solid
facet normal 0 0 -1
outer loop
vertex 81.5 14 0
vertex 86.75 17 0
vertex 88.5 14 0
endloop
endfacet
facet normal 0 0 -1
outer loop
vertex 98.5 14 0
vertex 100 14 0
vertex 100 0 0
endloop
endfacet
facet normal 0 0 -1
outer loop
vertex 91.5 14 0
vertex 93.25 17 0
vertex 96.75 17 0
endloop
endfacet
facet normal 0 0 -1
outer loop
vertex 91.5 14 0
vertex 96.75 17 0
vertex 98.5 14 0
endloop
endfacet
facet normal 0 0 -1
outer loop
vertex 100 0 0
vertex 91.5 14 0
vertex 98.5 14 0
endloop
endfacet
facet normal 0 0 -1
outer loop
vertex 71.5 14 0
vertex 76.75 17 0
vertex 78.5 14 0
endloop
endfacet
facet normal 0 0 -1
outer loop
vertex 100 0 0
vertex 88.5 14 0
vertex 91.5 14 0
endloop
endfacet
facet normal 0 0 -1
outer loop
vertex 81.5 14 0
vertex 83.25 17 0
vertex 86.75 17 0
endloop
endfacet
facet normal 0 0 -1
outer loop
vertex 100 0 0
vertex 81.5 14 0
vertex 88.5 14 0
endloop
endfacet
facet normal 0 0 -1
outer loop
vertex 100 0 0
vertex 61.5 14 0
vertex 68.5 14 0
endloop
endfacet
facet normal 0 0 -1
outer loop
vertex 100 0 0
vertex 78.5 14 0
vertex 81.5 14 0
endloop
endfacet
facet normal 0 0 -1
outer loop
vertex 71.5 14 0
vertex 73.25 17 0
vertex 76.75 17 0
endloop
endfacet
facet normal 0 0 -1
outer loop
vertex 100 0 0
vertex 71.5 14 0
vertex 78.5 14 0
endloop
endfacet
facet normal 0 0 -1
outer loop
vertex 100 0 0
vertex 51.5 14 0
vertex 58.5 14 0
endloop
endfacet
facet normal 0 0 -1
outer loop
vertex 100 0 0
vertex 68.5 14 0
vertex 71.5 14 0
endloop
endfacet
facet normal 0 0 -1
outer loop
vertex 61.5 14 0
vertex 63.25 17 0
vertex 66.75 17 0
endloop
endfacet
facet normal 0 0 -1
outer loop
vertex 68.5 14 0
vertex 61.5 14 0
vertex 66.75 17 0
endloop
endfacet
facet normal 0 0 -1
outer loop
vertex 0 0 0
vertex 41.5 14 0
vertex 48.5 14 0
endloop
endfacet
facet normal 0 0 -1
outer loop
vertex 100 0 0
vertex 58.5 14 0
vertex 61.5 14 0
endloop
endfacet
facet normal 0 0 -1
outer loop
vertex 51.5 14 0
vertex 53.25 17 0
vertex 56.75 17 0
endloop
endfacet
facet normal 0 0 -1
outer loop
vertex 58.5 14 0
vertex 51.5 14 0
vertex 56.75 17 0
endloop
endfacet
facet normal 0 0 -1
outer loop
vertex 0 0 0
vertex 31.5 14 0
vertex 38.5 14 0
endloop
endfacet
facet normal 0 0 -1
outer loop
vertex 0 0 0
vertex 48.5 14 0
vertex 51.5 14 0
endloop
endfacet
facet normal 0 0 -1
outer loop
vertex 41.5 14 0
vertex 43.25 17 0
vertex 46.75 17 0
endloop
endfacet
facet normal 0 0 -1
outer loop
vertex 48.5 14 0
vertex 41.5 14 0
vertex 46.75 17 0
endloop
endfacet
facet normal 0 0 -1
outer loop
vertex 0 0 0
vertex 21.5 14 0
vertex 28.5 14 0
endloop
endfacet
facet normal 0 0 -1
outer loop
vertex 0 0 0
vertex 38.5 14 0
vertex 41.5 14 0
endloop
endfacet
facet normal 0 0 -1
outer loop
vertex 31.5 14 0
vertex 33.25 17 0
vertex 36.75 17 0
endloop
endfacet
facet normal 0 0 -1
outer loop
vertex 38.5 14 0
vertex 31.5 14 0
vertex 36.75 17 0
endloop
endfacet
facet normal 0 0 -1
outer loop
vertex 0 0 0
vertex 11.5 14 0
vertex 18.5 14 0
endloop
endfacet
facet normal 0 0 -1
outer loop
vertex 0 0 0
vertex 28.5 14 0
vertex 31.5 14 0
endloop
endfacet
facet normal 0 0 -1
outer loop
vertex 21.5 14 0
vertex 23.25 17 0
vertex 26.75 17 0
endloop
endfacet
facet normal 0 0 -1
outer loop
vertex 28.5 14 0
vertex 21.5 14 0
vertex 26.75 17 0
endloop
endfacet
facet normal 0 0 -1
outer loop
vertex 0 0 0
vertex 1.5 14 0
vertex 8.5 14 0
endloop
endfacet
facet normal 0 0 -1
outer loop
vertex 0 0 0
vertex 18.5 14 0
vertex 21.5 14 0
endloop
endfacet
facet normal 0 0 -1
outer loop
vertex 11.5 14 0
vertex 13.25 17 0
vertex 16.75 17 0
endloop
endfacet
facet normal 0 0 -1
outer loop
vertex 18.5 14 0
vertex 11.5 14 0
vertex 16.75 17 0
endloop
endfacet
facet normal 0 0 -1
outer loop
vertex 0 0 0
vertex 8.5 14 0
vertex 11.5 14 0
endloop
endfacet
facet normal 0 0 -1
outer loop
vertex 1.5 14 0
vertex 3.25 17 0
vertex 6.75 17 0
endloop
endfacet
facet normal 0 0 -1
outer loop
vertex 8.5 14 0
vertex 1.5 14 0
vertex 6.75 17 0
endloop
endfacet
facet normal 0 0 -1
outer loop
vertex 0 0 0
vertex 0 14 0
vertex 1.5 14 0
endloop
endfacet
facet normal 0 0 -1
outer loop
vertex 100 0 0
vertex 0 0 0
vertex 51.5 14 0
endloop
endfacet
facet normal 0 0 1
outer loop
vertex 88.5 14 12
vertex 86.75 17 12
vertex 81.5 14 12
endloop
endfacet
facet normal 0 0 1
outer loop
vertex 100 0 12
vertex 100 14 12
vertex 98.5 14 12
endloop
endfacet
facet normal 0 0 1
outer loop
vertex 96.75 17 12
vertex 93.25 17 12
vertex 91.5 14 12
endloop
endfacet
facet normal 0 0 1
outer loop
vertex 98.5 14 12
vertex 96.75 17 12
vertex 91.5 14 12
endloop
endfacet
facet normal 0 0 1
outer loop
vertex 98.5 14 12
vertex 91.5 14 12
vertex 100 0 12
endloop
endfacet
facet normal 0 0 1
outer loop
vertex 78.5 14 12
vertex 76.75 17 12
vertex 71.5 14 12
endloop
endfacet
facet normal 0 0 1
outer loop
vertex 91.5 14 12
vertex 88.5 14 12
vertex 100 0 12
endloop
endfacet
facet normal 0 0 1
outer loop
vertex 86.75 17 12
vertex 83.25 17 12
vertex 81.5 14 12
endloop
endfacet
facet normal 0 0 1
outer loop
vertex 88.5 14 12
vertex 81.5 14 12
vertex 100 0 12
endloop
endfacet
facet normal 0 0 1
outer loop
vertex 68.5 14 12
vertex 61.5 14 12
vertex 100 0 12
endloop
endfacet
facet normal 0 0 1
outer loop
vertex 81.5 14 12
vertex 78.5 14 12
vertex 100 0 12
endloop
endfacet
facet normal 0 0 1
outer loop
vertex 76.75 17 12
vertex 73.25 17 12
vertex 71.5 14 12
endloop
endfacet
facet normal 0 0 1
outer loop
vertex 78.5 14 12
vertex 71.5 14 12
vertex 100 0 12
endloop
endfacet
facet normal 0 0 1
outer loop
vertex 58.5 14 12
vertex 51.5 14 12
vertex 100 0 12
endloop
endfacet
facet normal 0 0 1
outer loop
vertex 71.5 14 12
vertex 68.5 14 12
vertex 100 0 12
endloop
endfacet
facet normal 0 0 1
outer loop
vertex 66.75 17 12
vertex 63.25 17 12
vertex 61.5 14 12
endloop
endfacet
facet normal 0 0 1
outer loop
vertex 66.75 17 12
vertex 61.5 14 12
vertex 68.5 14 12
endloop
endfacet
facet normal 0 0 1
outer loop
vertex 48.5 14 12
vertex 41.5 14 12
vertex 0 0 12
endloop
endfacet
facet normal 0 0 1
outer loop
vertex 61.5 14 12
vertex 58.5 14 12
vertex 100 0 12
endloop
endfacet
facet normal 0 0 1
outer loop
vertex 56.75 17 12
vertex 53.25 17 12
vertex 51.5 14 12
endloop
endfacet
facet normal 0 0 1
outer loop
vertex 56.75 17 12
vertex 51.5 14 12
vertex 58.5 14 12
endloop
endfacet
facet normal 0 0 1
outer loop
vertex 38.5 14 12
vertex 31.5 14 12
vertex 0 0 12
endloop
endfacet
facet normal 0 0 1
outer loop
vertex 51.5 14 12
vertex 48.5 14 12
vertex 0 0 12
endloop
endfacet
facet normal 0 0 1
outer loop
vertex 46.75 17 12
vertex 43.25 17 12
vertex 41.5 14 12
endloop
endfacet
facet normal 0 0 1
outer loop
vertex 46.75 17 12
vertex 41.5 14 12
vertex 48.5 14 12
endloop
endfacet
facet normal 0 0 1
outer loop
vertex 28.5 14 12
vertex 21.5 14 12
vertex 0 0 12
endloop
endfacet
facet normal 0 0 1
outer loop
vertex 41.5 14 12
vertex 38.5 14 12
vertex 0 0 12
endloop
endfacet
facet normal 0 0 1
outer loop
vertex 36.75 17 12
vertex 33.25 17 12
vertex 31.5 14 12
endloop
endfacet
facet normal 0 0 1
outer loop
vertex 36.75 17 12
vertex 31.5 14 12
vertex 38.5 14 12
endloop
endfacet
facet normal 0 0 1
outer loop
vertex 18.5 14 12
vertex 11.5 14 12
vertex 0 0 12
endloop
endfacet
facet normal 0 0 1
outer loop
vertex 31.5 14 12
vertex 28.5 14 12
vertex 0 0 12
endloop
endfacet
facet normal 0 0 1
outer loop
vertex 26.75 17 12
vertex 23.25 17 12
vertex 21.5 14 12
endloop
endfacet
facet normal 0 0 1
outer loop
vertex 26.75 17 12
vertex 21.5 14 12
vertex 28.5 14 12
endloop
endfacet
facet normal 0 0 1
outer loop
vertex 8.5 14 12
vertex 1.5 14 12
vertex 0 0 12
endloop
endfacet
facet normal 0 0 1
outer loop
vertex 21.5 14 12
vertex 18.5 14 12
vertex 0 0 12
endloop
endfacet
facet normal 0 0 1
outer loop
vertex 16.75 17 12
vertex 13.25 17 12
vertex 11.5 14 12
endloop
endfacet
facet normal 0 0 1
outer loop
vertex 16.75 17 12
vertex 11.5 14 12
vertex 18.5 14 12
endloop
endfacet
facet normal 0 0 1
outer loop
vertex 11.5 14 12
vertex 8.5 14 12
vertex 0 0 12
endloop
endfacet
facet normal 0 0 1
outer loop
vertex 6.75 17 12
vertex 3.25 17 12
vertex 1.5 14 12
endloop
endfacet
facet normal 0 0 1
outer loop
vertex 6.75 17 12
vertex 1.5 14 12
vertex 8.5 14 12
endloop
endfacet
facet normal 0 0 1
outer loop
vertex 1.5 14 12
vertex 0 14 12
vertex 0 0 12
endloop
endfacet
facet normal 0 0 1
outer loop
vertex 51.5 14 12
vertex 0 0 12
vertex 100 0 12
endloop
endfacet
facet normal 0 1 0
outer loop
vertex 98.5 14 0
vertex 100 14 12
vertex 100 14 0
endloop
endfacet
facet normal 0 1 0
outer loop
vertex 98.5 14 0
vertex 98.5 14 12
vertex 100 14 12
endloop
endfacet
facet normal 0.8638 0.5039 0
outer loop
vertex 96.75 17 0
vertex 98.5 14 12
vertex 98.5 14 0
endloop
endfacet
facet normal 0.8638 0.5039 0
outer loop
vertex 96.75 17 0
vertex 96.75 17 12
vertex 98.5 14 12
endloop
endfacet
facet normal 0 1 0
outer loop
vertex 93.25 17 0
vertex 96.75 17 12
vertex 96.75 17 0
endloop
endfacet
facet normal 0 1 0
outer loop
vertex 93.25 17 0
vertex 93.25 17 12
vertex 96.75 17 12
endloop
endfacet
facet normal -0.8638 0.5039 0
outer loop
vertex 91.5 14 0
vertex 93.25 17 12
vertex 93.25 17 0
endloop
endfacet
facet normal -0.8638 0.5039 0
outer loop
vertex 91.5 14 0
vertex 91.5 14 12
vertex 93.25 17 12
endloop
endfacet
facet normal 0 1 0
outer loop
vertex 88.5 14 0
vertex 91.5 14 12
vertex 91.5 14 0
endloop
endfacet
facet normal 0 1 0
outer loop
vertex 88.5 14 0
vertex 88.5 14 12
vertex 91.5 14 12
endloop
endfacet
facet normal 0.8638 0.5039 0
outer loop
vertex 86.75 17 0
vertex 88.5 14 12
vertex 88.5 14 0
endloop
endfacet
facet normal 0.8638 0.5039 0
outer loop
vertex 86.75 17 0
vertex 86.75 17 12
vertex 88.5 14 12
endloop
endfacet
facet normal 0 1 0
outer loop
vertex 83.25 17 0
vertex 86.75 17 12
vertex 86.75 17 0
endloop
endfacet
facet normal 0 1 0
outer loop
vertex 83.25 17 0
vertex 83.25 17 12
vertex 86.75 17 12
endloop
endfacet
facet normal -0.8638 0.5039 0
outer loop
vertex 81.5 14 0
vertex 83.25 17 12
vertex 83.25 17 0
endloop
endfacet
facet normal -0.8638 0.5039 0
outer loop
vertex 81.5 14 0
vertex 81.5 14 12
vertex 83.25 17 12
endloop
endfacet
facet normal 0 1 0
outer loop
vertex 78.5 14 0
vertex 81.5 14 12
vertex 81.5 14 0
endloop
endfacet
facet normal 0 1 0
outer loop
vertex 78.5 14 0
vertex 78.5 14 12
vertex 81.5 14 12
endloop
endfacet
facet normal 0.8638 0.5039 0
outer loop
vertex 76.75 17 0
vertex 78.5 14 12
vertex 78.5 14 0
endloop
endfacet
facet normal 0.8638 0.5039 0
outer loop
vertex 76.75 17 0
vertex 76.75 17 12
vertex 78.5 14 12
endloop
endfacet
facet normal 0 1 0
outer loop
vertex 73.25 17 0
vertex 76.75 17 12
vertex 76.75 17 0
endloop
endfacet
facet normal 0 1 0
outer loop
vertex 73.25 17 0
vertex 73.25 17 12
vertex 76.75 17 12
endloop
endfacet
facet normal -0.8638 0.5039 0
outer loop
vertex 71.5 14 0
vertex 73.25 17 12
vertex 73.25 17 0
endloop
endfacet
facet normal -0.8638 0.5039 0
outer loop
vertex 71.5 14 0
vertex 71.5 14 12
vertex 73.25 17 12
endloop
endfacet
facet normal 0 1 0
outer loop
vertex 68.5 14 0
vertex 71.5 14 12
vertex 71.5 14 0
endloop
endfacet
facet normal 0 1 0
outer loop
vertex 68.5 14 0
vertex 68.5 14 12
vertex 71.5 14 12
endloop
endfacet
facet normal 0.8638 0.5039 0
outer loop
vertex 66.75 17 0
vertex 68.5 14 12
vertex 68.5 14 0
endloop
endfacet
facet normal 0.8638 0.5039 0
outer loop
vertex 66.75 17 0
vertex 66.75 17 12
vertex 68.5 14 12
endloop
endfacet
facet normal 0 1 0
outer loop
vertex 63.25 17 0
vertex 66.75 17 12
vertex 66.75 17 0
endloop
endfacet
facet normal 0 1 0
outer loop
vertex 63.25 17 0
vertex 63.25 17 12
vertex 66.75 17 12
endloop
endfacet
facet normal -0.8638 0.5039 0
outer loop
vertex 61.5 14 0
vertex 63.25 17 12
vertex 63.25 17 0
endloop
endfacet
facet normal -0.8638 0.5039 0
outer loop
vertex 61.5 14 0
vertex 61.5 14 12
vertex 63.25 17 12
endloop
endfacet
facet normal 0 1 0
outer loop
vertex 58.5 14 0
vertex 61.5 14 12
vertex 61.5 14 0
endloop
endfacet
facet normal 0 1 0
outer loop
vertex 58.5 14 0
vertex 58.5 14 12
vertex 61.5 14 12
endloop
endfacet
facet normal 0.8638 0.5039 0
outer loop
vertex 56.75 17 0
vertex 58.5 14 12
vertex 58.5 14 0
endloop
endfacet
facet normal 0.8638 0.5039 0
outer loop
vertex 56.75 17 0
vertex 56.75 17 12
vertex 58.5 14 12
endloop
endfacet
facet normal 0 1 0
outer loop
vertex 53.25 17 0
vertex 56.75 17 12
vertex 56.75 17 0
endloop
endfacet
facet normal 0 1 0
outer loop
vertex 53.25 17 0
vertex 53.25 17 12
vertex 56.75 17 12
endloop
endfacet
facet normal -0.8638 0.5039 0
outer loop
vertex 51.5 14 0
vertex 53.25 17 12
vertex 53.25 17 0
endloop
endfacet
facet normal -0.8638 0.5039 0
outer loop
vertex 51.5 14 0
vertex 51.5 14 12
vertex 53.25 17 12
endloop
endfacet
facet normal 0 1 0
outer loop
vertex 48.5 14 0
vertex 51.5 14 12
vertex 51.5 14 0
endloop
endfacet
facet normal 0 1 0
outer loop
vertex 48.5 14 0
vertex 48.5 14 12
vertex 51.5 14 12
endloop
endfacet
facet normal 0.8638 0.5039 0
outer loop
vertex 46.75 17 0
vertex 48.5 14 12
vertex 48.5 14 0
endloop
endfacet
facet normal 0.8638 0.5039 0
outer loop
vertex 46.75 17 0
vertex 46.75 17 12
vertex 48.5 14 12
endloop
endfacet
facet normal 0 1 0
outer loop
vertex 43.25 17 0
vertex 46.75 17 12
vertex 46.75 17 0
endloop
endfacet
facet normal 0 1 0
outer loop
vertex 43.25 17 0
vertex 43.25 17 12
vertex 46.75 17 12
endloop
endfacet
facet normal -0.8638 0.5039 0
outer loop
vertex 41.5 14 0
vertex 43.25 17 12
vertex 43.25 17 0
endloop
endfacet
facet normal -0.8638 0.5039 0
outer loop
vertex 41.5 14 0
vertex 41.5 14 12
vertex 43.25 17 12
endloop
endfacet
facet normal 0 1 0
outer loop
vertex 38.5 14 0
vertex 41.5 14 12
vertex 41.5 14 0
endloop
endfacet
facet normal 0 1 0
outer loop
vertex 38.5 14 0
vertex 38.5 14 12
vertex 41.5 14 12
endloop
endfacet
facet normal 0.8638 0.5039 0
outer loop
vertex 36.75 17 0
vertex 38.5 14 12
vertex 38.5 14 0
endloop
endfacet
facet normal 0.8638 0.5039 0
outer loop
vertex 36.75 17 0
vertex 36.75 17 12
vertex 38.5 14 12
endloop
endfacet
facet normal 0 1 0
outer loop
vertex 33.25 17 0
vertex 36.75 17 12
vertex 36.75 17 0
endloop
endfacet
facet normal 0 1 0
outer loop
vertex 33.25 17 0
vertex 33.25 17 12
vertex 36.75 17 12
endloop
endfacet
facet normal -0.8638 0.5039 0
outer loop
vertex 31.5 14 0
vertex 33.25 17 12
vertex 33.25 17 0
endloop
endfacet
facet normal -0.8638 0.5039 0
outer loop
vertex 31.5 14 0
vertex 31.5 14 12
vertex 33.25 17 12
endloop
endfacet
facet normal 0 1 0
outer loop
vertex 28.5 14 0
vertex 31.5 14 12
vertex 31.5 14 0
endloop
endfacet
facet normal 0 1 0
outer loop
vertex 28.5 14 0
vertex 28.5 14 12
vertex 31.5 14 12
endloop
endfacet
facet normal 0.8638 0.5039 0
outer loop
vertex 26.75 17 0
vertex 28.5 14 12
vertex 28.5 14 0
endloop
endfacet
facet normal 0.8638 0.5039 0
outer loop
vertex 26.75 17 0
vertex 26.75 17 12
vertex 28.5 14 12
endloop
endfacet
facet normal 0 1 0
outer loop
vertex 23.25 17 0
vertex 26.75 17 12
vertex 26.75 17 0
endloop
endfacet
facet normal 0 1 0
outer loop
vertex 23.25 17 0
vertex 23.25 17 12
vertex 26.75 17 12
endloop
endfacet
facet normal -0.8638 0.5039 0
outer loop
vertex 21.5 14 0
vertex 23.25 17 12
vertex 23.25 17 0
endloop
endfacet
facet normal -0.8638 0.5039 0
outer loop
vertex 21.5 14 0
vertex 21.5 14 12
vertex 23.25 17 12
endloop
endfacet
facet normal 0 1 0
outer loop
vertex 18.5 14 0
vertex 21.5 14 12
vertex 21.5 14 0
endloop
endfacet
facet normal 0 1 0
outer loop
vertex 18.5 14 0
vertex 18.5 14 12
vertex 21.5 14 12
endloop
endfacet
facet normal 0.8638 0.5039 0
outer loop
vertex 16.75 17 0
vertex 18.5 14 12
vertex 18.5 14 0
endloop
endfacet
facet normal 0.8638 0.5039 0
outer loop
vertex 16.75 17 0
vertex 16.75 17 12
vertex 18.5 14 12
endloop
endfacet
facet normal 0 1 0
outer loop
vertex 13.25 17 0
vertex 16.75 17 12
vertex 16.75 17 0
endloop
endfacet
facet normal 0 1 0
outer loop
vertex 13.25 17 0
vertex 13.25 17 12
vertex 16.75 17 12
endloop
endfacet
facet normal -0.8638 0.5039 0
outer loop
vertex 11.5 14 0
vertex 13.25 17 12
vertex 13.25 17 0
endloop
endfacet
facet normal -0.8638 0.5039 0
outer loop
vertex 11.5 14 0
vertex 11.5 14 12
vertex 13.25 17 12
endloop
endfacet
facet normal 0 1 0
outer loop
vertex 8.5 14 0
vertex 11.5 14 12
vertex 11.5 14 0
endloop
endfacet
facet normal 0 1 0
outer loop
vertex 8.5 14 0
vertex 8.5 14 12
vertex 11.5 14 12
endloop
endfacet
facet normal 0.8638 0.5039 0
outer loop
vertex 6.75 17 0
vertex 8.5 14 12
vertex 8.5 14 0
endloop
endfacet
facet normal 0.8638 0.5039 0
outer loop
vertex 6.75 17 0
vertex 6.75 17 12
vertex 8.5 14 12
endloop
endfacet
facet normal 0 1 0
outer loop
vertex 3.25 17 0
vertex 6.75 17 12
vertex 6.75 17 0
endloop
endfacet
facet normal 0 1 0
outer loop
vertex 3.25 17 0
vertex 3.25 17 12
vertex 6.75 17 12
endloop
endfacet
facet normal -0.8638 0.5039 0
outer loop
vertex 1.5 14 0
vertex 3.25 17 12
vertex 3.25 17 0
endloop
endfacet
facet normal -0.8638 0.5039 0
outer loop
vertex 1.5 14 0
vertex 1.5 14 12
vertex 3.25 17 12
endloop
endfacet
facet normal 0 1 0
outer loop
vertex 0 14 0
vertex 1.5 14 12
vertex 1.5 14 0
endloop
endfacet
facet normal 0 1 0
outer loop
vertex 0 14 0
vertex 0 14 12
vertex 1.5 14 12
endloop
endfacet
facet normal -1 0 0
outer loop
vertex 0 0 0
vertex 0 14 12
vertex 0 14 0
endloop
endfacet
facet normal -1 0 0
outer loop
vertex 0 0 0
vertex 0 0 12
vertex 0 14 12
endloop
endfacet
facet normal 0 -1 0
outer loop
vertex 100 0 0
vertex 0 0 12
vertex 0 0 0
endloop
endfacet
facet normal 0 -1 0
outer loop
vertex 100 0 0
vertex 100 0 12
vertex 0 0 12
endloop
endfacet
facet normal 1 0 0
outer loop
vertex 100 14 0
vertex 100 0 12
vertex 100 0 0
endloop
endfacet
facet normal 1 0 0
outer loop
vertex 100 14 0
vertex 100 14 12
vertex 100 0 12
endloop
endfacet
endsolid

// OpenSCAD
$fn = 32;

// ----------------------------------------------------------------------
// Gear rack: 10 teeth, pitch 10 mm
// ----------------------------------------------------------------------

// --- parameters (mm) ---
teeth = 10;               // number of teeth
pitch = 10;               // tooth pitch, X
root_w = 7;               // tooth width at the root
tip_w = 3.5;              // tooth width at the tip
base_h = 14;              // rack body height, Y
tooth_h = 3;              // tooth height above the body
plate_t = 12;             // rack width, Z (extrusion height)

rack_l = teeth * pitch;  // overall length
total_h = base_h + tooth_h;  // overall height

profile = [[0, 0], [100, 0], [100, 14], [98.5, 14], [96.75, 17], [93.25, 17], [91.5, 14], [88.5, 14], [86.75, 17], [83.25, 17], [81.5, 14], [78.5, 14], [76.75, 17], [73.25, 17], [71.5, 14], [68.5, 14], [66.75, 17], [63.25, 17], [61.5, 14], [58.5, 14], [56.75, 17], [53.25, 17], [51.5, 14], [48.5, 14], [46.75, 17], [43.25, 17], [41.5, 14], [38.5, 14], [36.75, 17], [33.25, 17], [31.5, 14], [28.5, 14], [26.75, 17], [23.25, 17], [21.5, 14], [18.5, 14], [16.75, 17], [13.25, 17], [11.5, 14], [8.5, 14], [6.75, 17], [3.25, 17], [1.5, 14], [0, 14]];  // primary outline, 44 points, counter clockwise

// --- the one profile operation ---
linear_extrude(height = plate_t) polygon(points = profile);
